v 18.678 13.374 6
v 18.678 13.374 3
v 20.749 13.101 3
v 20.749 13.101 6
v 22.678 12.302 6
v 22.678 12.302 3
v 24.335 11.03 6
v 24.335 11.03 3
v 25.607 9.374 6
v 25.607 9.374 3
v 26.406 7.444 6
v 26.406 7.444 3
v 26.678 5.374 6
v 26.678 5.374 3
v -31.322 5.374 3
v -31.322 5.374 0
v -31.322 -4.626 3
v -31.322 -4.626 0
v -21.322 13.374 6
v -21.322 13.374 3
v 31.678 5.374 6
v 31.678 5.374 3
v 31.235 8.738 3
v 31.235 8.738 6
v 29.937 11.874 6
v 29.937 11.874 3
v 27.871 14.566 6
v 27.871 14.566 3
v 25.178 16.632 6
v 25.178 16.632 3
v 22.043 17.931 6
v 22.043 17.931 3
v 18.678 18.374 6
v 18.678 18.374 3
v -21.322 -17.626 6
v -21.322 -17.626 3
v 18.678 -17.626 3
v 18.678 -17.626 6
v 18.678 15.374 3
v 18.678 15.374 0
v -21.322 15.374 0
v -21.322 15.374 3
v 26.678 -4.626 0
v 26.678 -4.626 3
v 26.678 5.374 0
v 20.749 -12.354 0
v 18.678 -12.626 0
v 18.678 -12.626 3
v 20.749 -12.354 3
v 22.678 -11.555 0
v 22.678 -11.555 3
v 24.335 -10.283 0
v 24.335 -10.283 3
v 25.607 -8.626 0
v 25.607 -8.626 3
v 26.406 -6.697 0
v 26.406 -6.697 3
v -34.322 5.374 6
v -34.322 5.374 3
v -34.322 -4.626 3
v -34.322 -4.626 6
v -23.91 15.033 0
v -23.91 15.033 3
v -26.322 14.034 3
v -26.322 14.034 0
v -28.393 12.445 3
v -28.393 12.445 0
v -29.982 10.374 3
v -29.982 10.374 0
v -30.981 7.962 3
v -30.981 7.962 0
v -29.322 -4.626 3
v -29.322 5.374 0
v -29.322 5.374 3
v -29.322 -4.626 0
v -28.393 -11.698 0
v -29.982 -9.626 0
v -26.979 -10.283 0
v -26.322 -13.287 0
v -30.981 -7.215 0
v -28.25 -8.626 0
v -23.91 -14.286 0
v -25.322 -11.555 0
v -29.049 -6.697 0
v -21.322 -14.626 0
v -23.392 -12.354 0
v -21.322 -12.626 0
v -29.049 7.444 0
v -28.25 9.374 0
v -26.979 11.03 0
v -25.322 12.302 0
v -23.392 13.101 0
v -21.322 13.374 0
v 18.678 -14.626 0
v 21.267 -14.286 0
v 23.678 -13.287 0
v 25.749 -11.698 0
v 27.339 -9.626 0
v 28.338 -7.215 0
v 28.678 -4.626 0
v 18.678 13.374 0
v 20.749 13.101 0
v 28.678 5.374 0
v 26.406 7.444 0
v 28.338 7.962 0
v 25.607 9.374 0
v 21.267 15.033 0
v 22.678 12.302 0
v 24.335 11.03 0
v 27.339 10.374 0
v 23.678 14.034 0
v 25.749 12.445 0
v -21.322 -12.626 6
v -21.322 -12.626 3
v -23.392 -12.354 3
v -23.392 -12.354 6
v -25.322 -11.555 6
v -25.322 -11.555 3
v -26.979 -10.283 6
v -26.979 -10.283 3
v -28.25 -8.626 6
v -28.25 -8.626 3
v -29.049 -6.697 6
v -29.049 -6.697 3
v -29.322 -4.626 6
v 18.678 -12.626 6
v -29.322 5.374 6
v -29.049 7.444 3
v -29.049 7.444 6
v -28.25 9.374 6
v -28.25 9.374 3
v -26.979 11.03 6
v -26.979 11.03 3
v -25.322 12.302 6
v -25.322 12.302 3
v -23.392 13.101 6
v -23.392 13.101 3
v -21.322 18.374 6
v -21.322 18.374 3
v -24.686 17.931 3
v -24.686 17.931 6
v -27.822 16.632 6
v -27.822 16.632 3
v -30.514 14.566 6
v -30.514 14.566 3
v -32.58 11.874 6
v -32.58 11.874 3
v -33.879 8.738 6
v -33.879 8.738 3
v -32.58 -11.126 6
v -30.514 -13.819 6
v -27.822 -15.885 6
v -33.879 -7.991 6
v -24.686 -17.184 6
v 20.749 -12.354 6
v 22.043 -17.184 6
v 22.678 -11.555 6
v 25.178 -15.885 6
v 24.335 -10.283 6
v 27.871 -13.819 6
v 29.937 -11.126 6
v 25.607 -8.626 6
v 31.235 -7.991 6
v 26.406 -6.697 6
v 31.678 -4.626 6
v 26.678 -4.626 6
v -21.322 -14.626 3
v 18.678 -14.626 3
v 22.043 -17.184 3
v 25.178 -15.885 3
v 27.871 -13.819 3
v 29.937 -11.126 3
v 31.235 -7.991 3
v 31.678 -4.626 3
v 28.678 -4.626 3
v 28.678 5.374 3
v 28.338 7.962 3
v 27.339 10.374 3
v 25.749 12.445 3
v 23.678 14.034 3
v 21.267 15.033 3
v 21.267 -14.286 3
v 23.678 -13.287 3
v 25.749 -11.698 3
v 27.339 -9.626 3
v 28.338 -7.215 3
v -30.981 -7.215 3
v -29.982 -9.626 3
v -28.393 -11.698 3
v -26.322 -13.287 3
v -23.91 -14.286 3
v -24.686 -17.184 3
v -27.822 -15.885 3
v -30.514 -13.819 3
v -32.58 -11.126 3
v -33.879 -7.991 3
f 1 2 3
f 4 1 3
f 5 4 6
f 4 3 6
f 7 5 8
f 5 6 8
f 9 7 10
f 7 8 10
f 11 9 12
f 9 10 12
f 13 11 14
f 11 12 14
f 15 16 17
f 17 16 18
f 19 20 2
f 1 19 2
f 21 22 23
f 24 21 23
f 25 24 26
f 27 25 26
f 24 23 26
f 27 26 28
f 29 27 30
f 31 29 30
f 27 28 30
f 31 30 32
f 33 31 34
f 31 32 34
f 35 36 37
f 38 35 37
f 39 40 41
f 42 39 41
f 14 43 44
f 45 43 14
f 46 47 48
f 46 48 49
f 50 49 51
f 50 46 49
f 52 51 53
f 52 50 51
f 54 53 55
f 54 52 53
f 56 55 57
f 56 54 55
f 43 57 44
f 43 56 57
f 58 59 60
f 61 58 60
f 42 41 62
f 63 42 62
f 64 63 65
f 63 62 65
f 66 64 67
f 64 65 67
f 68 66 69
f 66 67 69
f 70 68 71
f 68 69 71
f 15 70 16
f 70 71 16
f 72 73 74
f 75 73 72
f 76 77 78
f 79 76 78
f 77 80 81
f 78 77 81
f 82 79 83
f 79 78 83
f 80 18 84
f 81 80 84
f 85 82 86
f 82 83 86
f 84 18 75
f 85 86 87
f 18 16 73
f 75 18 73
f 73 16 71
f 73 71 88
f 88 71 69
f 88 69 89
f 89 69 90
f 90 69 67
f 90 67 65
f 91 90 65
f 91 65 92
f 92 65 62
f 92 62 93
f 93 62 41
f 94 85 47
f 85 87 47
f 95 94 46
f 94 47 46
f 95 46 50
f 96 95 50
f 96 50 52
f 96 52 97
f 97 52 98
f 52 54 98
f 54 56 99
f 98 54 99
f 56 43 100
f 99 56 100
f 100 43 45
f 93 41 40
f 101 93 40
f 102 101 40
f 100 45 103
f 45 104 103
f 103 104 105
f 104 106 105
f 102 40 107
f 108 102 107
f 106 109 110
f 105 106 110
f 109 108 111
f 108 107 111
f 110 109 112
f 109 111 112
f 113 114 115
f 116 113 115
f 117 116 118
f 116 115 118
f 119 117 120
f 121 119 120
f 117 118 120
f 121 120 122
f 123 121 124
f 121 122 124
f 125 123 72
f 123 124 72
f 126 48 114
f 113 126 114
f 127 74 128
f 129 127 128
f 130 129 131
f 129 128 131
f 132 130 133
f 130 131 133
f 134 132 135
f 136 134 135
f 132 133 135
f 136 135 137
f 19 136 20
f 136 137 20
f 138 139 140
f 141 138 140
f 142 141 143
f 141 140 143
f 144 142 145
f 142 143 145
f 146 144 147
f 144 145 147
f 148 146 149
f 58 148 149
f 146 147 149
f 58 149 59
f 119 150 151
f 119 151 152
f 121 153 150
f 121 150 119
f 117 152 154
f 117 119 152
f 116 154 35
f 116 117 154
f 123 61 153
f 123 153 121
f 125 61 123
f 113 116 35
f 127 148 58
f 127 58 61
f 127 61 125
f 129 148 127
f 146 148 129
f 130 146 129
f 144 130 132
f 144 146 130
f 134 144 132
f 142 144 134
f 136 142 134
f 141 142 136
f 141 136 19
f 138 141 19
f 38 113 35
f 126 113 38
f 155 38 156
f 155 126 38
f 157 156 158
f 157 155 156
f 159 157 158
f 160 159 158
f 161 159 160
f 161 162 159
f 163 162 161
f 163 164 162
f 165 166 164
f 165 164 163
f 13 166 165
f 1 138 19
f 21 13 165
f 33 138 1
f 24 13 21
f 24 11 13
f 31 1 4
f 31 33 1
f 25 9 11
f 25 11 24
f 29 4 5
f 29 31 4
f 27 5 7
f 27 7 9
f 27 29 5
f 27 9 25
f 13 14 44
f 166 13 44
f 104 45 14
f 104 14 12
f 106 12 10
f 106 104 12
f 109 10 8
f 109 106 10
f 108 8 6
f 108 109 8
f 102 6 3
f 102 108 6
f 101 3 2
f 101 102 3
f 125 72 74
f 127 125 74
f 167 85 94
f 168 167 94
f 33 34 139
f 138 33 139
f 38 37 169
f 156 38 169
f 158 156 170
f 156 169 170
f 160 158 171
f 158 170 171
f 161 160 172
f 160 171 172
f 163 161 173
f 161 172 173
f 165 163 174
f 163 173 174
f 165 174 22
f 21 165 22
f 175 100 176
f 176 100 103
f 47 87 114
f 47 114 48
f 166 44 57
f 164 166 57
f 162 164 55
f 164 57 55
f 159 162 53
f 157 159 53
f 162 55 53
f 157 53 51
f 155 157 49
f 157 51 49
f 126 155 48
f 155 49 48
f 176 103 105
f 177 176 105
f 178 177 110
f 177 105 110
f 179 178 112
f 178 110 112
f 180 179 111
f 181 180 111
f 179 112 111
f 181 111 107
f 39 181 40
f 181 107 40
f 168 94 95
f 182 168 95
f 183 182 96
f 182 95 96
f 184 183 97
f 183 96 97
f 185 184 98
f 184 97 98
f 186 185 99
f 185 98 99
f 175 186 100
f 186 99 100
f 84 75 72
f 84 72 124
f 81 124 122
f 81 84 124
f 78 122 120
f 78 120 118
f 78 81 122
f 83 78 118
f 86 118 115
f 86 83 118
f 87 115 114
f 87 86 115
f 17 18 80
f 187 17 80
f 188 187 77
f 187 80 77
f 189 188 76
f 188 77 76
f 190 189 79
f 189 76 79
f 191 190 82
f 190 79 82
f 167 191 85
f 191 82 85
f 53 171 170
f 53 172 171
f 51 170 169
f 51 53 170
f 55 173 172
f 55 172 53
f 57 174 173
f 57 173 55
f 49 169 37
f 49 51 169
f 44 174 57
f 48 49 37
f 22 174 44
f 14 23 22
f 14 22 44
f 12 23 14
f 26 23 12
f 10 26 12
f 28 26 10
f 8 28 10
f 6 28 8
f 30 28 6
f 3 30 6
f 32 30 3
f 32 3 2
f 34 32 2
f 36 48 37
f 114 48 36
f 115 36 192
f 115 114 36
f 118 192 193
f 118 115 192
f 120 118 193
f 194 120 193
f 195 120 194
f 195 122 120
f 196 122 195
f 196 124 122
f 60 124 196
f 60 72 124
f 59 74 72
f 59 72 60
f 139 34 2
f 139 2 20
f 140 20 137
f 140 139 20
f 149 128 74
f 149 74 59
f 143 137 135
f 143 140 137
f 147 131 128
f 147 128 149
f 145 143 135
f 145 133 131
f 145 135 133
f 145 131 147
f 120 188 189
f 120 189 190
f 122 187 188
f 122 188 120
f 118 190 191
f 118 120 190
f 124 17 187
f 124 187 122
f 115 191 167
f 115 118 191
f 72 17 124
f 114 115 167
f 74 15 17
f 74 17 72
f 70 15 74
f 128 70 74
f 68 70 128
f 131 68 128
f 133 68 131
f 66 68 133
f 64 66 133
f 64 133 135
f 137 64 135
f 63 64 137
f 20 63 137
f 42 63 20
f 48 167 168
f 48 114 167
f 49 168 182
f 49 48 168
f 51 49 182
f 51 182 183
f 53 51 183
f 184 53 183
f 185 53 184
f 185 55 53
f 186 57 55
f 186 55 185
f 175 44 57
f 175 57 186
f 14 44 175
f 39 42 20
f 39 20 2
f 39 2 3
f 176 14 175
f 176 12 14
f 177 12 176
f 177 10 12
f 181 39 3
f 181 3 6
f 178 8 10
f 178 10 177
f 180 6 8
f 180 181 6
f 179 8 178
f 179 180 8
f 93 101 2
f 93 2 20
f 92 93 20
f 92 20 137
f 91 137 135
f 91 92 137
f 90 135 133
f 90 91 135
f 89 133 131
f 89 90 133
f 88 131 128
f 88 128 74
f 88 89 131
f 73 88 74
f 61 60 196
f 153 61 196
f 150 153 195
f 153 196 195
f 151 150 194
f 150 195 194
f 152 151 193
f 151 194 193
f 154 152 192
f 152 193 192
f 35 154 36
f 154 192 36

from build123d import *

# Parameters (mm, degrees)
BOSS_EXTRU_1_DEPTH      = 3
BOSS_EXTRU_2_DEPTH      = 3
ENL_V_MAT_EXTRU_1_DEPTH = 40.045647227


with BuildPart() as part:
    # Esquisse2 → Boss.-Extru.1 (new body)
    with BuildSketch(Plane.XY):
        with BuildLine():
            Line((28.678345257, -4.626470588), (28.678345257, 5.373529412))
            ThreePointArc((28.678345257, 5.373529412), (25.749413069, 12.444597224), (18.678345257, 15.373529412))
            Line((18.678345257, 15.373529412), (-21.321654743, 15.373529412))
            ThreePointArc((-21.321654743, 15.373529412), (-28.392722555, 12.444597224), (-31.321654743, 5.373529412))
            Line((-31.321654743, 5.373529412), (-31.321654743, -4.626470588))
            ThreePointArc((-31.321654743, -4.626470588), (-28.392722555, -11.6975384), (-21.321654743, -14.626470588))
            Line((-21.321654743, -14.626470588), (18.678345257, -14.626470588))
            ThreePointArc((18.678345257, -14.626470588), (25.749413069, -11.6975384), (28.678345257, -4.626470588))
        make_face()
        with BuildLine():
            Line((26.678345257, -4.626470588), (26.678345257, 5.373529412))
            ThreePointArc((26.678345257, 5.373529412), (24.335199507, 11.030383661), (18.678345257, 13.373529412))
            Line((18.678345257, 13.373529412), (-21.321654743, 13.373529412))
            ThreePointArc((-21.321654743, 13.373529412), (-26.978508992, 11.030383661), (-29.321654743, 5.373529412))
            Line((-29.321654743, 5.373529412), (-29.321654743, -4.626470588))
            ThreePointArc((-29.321654743, -4.626470588), (-26.978508992, -10.283324838), (-21.321654743, -12.626470588))
            Line((-21.321654743, -12.626470588), (18.678345257, -12.626470588))
            ThreePointArc((18.678345257, -12.626470588), (24.335199507, -10.283324838), (26.678345257, -4.626470588))
        make_face(mode=Mode.SUBTRACT)
    extrude(amount=BOSS_EXTRU_1_DEPTH)


with BuildPart() as body_2:
    # Esquisse3 → Boss.-Extru.2 (new body)
    # profile 1 of 3: a face of its own
    with BuildSketch(Plane.XY.offset(3)):
        with BuildLine():
            Line((-21.321654743, -17.626470588), (18.678345257, -17.626470588))
            ThreePointArc((18.678345257, -17.626470588), (27.870733412, -13.818858744), (31.678345257, -4.626470588))
            Line((31.678345257, -4.626470588), (31.678345257, 5.373529412))
            ThreePointArc((31.678345257, 5.373529412), (27.870733412, 14.565917567), (18.678345257, 18.373529412))
            Line((18.678345257, 18.373529412), (-21.321654743, 18.373529412))
            ThreePointArc((-21.321654743, 18.373529412), (-30.514042898, 14.565917567), (-34.321654743, 5.373529412))
            Line((-34.321654743, 5.373529412), (-34.321654743, -4.626470588))
            ThreePointArc((-34.321654743, -4.626470588), (-30.514042898, -13.818858744), (-21.321654743, -17.626470588))
        make_face()
        with BuildLine():
            ThreePointArc((28.678345257, 5.373529412), (25.749413069, 12.444597224), (18.678345257, 15.373529412))
            Line((18.678345257, 15.373529412), (-21.321654743, 15.373529412))
            ThreePointArc((-21.321654743, 15.373529412), (-28.392722555, 12.444597224), (-31.321654743, 5.373529412))
            Line((-31.321654743, 5.373529412), (-31.321654743, -4.626470588))
            ThreePointArc((-31.321654743, -4.626470588), (-28.392722555, -11.6975384), (-21.321654743, -14.626470588))
            Line((-21.321654743, -14.626470588), (18.678345257, -14.626470588))
            ThreePointArc((18.678345257, -14.626470588), (25.749413069, -11.6975384), (28.678345257, -4.626470588))
            Line((28.678345257, -4.626470588), (28.678345257, 5.373529412))
        make_face(mode=Mode.SUBTRACT)
    # profile 2 of 3: a face of its own
    with BuildSketch(Plane.XY.offset(3)):
        with BuildLine():
            Line((28.678345257, -4.626470588), (28.678345257, 5.373529412))
            ThreePointArc((28.678345257, 5.373529412), (25.749413069, 12.444597224), (18.678345257, 15.373529412))
            Line((18.678345257, 15.373529412), (-21.321654743, 15.373529412))
            ThreePointArc((-21.321654743, 15.373529412), (-28.392722555, 12.444597224), (-31.321654743, 5.373529412))
            Line((-31.321654743, 5.373529412), (-31.321654743, -4.626470588))
            ThreePointArc((-31.321654743, -4.626470588), (-28.392722555, -11.6975384), (-21.321654743, -14.626470588))
            Line((-21.321654743, -14.626470588), (18.678345257, -14.626470588))
            ThreePointArc((18.678345257, -14.626470588), (25.749413069, -11.6975384), (28.678345257, -4.626470588))
        make_face()
        with BuildLine():
            ThreePointArc((18.678345257, 13.373529412), (24.335199507, 11.030383661), (26.678345257, 5.373529412))
            Line((26.678345257, 5.373529412), (26.678345257, -4.626470588))
            ThreePointArc((26.678345257, -4.626470588), (24.335199507, -10.283324838), (18.678345257, -12.626470588))
            Line((18.678345257, -12.626470588), (-21.321654743, -12.626470588))
            ThreePointArc((-21.321654743, -12.626470588), (-26.978508992, -10.283324838), (-29.321654743, -4.626470588))
            Line((-29.321654743, -4.626470588), (-29.321654743, 5.373529412))
            ThreePointArc((-29.321654743, 5.373529412), (-26.978508992, 11.030383661), (-21.321654743, 13.373529412))
            Line((-21.321654743, 13.373529412), (18.678345257, 13.373529412))
        make_face(mode=Mode.SUBTRACT)
    # profile 3 of 3: a face of its own
    with BuildSketch(Plane.XY.offset(3)):
        with BuildLine():
            Line((26.678345257, 5.373529412), (26.678345257, -4.626470588))
            ThreePointArc((26.678345257, -4.626470588), (24.335199507, -10.283324838), (18.678345257, -12.626470588))
            Line((18.678345257, -12.626470588), (-21.321654743, -12.626470588))
            ThreePointArc((-21.321654743, -12.626470588), (-26.978508992, -10.283324838), (-29.321654743, -4.626470588))
            Line((-29.321654743, -4.626470588), (-29.321654743, 5.373529412))
            ThreePointArc((-29.321654743, 5.373529412), (-26.978508992, 11.030383661), (-21.321654743, 13.373529412))
            Line((-21.321654743, 13.373529412), (18.678345257, 13.373529412))
            ThreePointArc((18.678345257, 13.373529412), (24.335199507, 11.030383661), (26.678345257, 5.373529412))
        make_face()
    extrude(amount=BOSS_EXTRU_2_DEPTH)

    # Esquisse4 → Enlèv. mat.-Extru.1 (cut, through all)
    with BuildSketch(Plane(origin=(0, 0, 3), x_dir=(-1, 0, 0), z_dir=(0, 0, -1))):
        with BuildLine():
            Line((21.321654743, 13.373529412), (-18.678345257, 13.373529412))
            ThreePointArc((-18.678345257, 13.373529412), (-24.335199507, 11.030383661), (-26.678345257, 5.373529412))
            Line((-26.678345257, 5.373529412), (-26.678345257, -4.626470588))
            ThreePointArc((-26.678345257, -4.626470588), (-24.335199507, -10.283324838), (-18.678345257, -12.626470588))
            Line((-18.678345257, -12.626470588), (21.321654743, -12.626470588))
            ThreePointArc((21.321654743, -12.626470588), (26.978508992, -10.283324838), (29.321654743, -4.626470588))
            Line((29.321654743, -4.626470588), (29.321654743, 5.373529412))
            ThreePointArc((29.321654743, 5.373529412), (26.978508992, 11.030383661), (21.321654743, 13.373529412))
        make_face()
    extrude(amount=-ENL_V_MAT_EXTRU_1_DEPTH, mode=Mode.SUBTRACT)


solid = Compound([part.part, body_2.part])
